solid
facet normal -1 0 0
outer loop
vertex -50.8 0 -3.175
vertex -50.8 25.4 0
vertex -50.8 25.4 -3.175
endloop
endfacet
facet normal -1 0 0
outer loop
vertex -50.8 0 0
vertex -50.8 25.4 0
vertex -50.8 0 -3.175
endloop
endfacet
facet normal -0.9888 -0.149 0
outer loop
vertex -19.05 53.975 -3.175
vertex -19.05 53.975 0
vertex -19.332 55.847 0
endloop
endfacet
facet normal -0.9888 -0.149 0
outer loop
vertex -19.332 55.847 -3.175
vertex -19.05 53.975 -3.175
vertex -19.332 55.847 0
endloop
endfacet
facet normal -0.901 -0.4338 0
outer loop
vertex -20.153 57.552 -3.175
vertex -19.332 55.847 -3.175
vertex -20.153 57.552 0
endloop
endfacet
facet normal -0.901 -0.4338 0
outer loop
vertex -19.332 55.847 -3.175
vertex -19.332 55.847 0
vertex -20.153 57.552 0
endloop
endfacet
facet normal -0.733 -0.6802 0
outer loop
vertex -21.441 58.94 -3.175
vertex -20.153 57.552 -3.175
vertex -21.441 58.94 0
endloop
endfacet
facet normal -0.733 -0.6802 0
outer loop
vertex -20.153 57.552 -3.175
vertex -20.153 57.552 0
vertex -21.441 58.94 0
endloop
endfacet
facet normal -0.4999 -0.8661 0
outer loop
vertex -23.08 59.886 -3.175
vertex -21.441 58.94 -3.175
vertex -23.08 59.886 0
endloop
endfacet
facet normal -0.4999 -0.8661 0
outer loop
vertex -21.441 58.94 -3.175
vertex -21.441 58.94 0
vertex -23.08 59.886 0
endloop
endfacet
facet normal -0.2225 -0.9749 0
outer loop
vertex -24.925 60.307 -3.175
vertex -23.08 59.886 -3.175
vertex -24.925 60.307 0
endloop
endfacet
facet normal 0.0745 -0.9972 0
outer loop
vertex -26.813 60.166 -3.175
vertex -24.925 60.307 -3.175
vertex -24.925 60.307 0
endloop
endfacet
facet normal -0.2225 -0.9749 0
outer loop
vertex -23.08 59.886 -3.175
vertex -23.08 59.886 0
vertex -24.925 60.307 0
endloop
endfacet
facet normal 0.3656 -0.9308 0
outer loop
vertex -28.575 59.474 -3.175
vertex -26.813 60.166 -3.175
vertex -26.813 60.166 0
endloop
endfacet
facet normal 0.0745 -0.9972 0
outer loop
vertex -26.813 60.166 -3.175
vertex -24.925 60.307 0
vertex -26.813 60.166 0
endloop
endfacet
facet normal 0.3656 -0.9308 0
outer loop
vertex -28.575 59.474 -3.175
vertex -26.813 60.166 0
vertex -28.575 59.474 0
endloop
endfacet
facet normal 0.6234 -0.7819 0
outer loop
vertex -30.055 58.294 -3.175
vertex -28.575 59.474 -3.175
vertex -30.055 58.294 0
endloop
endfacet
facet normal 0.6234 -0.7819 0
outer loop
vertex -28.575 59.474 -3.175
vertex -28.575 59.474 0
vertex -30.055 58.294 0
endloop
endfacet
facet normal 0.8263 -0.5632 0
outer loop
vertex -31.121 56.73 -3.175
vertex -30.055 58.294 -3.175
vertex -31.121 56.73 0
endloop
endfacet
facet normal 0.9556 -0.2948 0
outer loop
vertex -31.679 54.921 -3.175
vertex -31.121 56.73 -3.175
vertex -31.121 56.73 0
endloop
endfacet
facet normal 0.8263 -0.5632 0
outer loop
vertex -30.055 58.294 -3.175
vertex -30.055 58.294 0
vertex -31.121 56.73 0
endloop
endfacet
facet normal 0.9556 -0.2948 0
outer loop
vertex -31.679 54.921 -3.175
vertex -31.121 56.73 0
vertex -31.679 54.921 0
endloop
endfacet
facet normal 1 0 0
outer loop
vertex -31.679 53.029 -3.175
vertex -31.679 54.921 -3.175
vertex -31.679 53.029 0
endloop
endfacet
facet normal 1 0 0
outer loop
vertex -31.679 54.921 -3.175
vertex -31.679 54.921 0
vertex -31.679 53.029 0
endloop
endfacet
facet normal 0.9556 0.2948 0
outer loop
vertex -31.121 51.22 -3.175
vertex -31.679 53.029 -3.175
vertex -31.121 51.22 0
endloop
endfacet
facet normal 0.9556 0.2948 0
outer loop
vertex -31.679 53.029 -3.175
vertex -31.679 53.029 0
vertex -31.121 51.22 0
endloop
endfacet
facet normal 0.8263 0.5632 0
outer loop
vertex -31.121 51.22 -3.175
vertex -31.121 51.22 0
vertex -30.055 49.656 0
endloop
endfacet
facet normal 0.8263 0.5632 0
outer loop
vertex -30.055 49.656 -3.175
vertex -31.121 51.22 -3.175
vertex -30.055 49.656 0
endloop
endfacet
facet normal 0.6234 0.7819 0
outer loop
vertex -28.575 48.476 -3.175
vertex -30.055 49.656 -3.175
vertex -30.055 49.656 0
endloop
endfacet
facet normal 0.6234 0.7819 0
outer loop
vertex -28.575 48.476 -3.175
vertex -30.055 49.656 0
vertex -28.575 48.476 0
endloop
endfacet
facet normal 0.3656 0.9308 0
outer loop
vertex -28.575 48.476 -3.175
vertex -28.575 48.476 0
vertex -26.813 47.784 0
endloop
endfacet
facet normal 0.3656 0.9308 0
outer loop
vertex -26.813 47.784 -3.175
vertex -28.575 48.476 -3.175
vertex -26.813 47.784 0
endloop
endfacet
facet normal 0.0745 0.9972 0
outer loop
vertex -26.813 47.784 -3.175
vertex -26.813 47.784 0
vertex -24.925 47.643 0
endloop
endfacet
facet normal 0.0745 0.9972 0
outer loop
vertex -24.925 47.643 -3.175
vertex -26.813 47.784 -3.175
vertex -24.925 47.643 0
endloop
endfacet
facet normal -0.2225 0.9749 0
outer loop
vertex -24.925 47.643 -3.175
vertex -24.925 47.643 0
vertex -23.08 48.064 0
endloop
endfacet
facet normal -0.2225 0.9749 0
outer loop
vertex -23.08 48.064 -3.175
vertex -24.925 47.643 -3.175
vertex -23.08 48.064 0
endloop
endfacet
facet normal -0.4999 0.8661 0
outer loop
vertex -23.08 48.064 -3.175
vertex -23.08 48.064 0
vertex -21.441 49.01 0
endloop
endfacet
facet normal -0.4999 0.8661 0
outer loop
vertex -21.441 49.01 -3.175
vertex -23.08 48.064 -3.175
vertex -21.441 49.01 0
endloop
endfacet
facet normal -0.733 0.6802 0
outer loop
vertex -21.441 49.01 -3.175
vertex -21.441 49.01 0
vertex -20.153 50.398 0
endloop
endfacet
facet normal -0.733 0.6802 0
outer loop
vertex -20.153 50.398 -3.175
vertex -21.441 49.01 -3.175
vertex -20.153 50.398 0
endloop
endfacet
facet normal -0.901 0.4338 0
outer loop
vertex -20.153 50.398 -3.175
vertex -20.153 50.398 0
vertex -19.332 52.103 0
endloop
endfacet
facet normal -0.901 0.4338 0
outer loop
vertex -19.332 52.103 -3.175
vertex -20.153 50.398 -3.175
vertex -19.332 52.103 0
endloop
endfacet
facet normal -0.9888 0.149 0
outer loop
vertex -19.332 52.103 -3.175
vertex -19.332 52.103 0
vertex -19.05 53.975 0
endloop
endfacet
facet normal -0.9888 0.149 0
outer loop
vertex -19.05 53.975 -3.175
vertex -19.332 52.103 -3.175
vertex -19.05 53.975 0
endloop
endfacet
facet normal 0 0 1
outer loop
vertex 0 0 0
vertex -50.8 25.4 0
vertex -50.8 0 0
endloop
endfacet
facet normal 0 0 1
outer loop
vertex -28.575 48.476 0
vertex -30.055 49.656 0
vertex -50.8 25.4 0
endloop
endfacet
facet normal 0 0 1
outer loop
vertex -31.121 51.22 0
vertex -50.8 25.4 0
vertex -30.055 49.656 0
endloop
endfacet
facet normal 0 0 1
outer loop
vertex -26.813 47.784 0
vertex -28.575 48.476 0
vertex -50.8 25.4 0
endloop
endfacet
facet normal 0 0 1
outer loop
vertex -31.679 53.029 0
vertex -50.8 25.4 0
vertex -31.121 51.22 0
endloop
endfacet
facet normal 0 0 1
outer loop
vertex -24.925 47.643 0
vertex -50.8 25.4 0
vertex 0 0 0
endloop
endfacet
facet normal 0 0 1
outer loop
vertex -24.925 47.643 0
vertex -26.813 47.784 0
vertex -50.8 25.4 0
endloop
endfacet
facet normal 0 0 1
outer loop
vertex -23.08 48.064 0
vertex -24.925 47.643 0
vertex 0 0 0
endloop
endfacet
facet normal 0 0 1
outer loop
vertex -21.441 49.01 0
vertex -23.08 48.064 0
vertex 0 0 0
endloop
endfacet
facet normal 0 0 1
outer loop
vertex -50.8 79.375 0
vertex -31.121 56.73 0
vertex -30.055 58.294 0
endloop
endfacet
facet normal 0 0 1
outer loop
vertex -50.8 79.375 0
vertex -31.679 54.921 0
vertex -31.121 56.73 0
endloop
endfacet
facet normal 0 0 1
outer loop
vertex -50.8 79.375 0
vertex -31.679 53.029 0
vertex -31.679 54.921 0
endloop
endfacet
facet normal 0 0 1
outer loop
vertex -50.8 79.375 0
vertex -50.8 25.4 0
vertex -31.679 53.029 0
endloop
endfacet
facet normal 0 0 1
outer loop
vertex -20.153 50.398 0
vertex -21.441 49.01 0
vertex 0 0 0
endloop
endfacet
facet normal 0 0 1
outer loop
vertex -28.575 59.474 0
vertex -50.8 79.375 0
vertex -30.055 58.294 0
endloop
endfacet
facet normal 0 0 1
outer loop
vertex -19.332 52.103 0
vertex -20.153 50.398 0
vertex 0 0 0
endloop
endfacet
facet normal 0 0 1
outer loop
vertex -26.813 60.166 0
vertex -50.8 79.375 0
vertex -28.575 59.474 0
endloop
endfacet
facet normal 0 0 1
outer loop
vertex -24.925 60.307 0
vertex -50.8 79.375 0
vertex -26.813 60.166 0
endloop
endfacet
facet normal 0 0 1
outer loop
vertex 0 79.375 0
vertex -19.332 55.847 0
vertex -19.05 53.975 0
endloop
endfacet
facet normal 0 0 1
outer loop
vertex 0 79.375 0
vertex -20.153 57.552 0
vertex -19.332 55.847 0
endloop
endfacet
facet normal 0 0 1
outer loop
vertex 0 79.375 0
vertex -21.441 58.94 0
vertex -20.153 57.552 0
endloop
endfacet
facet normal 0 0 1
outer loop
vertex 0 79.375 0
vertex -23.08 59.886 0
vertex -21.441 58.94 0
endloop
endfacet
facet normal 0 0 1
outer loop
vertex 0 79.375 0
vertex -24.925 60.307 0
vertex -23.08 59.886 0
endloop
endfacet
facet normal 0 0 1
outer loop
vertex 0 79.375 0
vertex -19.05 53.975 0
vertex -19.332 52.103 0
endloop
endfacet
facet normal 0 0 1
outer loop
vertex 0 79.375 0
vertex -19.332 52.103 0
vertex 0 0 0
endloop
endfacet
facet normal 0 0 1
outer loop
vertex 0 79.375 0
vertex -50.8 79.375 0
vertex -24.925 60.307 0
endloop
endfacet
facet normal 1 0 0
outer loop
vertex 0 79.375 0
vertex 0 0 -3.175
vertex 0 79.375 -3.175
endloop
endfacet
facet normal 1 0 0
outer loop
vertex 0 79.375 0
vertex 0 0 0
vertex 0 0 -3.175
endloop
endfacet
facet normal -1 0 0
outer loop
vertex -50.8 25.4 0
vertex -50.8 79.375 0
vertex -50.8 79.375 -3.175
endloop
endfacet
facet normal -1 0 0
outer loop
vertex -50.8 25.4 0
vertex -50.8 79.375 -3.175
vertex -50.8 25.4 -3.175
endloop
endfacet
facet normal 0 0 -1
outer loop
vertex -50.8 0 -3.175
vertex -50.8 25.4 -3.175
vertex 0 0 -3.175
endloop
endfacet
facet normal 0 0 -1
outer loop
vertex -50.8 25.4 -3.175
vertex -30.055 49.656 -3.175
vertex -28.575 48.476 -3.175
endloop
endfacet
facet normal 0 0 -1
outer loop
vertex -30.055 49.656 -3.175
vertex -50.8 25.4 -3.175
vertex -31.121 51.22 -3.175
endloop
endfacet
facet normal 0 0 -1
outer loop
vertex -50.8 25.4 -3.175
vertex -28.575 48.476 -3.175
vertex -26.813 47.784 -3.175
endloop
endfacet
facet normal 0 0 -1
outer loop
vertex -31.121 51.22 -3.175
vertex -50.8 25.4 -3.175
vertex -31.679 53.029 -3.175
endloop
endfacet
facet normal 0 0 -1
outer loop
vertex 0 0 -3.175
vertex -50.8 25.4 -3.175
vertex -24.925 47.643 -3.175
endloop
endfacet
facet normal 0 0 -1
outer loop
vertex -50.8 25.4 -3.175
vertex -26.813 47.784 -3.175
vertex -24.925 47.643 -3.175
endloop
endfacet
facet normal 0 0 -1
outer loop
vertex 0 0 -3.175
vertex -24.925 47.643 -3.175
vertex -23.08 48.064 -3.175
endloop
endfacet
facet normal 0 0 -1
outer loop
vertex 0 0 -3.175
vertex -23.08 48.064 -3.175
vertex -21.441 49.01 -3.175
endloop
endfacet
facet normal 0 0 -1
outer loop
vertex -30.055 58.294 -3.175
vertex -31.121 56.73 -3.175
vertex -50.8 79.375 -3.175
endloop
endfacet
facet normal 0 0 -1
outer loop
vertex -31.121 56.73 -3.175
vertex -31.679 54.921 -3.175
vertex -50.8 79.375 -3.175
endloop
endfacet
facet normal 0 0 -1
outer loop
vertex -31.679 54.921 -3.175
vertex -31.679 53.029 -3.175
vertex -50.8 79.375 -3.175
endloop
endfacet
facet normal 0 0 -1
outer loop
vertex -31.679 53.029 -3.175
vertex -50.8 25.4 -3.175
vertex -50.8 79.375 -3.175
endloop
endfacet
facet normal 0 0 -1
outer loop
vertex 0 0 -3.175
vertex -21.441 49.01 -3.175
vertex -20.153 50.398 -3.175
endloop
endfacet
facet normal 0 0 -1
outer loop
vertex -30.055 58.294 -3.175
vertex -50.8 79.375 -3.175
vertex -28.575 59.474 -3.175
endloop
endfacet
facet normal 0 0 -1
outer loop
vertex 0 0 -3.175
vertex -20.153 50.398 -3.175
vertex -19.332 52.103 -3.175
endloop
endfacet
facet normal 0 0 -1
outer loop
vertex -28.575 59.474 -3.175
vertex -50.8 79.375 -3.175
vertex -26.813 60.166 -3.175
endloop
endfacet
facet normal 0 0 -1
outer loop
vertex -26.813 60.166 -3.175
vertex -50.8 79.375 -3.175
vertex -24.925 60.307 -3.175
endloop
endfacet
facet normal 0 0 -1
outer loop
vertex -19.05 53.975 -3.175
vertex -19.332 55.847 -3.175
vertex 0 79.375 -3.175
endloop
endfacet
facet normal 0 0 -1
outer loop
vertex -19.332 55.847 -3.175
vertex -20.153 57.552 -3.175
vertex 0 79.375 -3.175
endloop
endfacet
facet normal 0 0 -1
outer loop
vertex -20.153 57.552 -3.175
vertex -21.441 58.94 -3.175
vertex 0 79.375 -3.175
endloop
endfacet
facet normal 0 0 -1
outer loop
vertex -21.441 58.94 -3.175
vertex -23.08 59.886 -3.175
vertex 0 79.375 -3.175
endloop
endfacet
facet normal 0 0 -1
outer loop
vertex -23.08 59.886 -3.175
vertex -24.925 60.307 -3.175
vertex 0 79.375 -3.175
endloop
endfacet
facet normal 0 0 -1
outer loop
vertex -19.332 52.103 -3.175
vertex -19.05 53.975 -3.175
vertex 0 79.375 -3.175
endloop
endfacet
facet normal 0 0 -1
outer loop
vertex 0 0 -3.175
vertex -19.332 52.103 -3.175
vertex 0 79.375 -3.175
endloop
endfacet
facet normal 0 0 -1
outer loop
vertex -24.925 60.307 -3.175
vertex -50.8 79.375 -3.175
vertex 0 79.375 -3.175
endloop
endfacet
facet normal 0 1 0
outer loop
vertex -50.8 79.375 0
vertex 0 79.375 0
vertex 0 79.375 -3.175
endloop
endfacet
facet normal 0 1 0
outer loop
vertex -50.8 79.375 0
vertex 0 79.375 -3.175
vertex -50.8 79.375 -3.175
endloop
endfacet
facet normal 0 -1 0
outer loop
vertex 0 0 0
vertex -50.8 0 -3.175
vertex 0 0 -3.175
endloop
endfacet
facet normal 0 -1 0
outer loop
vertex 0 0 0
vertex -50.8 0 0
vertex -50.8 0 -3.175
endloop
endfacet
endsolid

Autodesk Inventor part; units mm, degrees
ref_plane "YZ Plane" through (0, 0, 0) normal (1, 0, 0) x (0, 1, 0)
ref_plane "XZ Plane" through (0, 0, 0) normal (0, 1, 0) x (-1, 0, 0)
ref_plane "XY Plane" through (0, 0, 0) normal (0, 0, 1) x (1, 0, 0)
sketch "Sketch1" plane through (0, 0, 0) normal (0, 0, 1) x (1, 0, 0)
  line L0 (0, 0) -> (0, 79.375)
  line L1 (0, 79.375) -> (-50.8, 79.375)
  line L2 (-50.8, 79.375) -> (-50.8, 25.4)
  line L3 (-50.8, 25.4) -> (-50.8, 0)
  line L4 (-50.8, 0) -> (0, 0)
  circle A0 centre (-25.4, 53.975) radius 6.35
  dimension "d0" = 79.375
  dimension "d1" = 50.8
  dimension "d2" = 25.4
  dimension "d3" = 50.8
  dimension "d4" = 25.4
  dimension "d5" = 25.4
  dimension "d6" = 12.7
extrude "Extrusion1" add sketch "Sketch1" against normal blind 3.175
properties part number "gearmotor mounting plate"
